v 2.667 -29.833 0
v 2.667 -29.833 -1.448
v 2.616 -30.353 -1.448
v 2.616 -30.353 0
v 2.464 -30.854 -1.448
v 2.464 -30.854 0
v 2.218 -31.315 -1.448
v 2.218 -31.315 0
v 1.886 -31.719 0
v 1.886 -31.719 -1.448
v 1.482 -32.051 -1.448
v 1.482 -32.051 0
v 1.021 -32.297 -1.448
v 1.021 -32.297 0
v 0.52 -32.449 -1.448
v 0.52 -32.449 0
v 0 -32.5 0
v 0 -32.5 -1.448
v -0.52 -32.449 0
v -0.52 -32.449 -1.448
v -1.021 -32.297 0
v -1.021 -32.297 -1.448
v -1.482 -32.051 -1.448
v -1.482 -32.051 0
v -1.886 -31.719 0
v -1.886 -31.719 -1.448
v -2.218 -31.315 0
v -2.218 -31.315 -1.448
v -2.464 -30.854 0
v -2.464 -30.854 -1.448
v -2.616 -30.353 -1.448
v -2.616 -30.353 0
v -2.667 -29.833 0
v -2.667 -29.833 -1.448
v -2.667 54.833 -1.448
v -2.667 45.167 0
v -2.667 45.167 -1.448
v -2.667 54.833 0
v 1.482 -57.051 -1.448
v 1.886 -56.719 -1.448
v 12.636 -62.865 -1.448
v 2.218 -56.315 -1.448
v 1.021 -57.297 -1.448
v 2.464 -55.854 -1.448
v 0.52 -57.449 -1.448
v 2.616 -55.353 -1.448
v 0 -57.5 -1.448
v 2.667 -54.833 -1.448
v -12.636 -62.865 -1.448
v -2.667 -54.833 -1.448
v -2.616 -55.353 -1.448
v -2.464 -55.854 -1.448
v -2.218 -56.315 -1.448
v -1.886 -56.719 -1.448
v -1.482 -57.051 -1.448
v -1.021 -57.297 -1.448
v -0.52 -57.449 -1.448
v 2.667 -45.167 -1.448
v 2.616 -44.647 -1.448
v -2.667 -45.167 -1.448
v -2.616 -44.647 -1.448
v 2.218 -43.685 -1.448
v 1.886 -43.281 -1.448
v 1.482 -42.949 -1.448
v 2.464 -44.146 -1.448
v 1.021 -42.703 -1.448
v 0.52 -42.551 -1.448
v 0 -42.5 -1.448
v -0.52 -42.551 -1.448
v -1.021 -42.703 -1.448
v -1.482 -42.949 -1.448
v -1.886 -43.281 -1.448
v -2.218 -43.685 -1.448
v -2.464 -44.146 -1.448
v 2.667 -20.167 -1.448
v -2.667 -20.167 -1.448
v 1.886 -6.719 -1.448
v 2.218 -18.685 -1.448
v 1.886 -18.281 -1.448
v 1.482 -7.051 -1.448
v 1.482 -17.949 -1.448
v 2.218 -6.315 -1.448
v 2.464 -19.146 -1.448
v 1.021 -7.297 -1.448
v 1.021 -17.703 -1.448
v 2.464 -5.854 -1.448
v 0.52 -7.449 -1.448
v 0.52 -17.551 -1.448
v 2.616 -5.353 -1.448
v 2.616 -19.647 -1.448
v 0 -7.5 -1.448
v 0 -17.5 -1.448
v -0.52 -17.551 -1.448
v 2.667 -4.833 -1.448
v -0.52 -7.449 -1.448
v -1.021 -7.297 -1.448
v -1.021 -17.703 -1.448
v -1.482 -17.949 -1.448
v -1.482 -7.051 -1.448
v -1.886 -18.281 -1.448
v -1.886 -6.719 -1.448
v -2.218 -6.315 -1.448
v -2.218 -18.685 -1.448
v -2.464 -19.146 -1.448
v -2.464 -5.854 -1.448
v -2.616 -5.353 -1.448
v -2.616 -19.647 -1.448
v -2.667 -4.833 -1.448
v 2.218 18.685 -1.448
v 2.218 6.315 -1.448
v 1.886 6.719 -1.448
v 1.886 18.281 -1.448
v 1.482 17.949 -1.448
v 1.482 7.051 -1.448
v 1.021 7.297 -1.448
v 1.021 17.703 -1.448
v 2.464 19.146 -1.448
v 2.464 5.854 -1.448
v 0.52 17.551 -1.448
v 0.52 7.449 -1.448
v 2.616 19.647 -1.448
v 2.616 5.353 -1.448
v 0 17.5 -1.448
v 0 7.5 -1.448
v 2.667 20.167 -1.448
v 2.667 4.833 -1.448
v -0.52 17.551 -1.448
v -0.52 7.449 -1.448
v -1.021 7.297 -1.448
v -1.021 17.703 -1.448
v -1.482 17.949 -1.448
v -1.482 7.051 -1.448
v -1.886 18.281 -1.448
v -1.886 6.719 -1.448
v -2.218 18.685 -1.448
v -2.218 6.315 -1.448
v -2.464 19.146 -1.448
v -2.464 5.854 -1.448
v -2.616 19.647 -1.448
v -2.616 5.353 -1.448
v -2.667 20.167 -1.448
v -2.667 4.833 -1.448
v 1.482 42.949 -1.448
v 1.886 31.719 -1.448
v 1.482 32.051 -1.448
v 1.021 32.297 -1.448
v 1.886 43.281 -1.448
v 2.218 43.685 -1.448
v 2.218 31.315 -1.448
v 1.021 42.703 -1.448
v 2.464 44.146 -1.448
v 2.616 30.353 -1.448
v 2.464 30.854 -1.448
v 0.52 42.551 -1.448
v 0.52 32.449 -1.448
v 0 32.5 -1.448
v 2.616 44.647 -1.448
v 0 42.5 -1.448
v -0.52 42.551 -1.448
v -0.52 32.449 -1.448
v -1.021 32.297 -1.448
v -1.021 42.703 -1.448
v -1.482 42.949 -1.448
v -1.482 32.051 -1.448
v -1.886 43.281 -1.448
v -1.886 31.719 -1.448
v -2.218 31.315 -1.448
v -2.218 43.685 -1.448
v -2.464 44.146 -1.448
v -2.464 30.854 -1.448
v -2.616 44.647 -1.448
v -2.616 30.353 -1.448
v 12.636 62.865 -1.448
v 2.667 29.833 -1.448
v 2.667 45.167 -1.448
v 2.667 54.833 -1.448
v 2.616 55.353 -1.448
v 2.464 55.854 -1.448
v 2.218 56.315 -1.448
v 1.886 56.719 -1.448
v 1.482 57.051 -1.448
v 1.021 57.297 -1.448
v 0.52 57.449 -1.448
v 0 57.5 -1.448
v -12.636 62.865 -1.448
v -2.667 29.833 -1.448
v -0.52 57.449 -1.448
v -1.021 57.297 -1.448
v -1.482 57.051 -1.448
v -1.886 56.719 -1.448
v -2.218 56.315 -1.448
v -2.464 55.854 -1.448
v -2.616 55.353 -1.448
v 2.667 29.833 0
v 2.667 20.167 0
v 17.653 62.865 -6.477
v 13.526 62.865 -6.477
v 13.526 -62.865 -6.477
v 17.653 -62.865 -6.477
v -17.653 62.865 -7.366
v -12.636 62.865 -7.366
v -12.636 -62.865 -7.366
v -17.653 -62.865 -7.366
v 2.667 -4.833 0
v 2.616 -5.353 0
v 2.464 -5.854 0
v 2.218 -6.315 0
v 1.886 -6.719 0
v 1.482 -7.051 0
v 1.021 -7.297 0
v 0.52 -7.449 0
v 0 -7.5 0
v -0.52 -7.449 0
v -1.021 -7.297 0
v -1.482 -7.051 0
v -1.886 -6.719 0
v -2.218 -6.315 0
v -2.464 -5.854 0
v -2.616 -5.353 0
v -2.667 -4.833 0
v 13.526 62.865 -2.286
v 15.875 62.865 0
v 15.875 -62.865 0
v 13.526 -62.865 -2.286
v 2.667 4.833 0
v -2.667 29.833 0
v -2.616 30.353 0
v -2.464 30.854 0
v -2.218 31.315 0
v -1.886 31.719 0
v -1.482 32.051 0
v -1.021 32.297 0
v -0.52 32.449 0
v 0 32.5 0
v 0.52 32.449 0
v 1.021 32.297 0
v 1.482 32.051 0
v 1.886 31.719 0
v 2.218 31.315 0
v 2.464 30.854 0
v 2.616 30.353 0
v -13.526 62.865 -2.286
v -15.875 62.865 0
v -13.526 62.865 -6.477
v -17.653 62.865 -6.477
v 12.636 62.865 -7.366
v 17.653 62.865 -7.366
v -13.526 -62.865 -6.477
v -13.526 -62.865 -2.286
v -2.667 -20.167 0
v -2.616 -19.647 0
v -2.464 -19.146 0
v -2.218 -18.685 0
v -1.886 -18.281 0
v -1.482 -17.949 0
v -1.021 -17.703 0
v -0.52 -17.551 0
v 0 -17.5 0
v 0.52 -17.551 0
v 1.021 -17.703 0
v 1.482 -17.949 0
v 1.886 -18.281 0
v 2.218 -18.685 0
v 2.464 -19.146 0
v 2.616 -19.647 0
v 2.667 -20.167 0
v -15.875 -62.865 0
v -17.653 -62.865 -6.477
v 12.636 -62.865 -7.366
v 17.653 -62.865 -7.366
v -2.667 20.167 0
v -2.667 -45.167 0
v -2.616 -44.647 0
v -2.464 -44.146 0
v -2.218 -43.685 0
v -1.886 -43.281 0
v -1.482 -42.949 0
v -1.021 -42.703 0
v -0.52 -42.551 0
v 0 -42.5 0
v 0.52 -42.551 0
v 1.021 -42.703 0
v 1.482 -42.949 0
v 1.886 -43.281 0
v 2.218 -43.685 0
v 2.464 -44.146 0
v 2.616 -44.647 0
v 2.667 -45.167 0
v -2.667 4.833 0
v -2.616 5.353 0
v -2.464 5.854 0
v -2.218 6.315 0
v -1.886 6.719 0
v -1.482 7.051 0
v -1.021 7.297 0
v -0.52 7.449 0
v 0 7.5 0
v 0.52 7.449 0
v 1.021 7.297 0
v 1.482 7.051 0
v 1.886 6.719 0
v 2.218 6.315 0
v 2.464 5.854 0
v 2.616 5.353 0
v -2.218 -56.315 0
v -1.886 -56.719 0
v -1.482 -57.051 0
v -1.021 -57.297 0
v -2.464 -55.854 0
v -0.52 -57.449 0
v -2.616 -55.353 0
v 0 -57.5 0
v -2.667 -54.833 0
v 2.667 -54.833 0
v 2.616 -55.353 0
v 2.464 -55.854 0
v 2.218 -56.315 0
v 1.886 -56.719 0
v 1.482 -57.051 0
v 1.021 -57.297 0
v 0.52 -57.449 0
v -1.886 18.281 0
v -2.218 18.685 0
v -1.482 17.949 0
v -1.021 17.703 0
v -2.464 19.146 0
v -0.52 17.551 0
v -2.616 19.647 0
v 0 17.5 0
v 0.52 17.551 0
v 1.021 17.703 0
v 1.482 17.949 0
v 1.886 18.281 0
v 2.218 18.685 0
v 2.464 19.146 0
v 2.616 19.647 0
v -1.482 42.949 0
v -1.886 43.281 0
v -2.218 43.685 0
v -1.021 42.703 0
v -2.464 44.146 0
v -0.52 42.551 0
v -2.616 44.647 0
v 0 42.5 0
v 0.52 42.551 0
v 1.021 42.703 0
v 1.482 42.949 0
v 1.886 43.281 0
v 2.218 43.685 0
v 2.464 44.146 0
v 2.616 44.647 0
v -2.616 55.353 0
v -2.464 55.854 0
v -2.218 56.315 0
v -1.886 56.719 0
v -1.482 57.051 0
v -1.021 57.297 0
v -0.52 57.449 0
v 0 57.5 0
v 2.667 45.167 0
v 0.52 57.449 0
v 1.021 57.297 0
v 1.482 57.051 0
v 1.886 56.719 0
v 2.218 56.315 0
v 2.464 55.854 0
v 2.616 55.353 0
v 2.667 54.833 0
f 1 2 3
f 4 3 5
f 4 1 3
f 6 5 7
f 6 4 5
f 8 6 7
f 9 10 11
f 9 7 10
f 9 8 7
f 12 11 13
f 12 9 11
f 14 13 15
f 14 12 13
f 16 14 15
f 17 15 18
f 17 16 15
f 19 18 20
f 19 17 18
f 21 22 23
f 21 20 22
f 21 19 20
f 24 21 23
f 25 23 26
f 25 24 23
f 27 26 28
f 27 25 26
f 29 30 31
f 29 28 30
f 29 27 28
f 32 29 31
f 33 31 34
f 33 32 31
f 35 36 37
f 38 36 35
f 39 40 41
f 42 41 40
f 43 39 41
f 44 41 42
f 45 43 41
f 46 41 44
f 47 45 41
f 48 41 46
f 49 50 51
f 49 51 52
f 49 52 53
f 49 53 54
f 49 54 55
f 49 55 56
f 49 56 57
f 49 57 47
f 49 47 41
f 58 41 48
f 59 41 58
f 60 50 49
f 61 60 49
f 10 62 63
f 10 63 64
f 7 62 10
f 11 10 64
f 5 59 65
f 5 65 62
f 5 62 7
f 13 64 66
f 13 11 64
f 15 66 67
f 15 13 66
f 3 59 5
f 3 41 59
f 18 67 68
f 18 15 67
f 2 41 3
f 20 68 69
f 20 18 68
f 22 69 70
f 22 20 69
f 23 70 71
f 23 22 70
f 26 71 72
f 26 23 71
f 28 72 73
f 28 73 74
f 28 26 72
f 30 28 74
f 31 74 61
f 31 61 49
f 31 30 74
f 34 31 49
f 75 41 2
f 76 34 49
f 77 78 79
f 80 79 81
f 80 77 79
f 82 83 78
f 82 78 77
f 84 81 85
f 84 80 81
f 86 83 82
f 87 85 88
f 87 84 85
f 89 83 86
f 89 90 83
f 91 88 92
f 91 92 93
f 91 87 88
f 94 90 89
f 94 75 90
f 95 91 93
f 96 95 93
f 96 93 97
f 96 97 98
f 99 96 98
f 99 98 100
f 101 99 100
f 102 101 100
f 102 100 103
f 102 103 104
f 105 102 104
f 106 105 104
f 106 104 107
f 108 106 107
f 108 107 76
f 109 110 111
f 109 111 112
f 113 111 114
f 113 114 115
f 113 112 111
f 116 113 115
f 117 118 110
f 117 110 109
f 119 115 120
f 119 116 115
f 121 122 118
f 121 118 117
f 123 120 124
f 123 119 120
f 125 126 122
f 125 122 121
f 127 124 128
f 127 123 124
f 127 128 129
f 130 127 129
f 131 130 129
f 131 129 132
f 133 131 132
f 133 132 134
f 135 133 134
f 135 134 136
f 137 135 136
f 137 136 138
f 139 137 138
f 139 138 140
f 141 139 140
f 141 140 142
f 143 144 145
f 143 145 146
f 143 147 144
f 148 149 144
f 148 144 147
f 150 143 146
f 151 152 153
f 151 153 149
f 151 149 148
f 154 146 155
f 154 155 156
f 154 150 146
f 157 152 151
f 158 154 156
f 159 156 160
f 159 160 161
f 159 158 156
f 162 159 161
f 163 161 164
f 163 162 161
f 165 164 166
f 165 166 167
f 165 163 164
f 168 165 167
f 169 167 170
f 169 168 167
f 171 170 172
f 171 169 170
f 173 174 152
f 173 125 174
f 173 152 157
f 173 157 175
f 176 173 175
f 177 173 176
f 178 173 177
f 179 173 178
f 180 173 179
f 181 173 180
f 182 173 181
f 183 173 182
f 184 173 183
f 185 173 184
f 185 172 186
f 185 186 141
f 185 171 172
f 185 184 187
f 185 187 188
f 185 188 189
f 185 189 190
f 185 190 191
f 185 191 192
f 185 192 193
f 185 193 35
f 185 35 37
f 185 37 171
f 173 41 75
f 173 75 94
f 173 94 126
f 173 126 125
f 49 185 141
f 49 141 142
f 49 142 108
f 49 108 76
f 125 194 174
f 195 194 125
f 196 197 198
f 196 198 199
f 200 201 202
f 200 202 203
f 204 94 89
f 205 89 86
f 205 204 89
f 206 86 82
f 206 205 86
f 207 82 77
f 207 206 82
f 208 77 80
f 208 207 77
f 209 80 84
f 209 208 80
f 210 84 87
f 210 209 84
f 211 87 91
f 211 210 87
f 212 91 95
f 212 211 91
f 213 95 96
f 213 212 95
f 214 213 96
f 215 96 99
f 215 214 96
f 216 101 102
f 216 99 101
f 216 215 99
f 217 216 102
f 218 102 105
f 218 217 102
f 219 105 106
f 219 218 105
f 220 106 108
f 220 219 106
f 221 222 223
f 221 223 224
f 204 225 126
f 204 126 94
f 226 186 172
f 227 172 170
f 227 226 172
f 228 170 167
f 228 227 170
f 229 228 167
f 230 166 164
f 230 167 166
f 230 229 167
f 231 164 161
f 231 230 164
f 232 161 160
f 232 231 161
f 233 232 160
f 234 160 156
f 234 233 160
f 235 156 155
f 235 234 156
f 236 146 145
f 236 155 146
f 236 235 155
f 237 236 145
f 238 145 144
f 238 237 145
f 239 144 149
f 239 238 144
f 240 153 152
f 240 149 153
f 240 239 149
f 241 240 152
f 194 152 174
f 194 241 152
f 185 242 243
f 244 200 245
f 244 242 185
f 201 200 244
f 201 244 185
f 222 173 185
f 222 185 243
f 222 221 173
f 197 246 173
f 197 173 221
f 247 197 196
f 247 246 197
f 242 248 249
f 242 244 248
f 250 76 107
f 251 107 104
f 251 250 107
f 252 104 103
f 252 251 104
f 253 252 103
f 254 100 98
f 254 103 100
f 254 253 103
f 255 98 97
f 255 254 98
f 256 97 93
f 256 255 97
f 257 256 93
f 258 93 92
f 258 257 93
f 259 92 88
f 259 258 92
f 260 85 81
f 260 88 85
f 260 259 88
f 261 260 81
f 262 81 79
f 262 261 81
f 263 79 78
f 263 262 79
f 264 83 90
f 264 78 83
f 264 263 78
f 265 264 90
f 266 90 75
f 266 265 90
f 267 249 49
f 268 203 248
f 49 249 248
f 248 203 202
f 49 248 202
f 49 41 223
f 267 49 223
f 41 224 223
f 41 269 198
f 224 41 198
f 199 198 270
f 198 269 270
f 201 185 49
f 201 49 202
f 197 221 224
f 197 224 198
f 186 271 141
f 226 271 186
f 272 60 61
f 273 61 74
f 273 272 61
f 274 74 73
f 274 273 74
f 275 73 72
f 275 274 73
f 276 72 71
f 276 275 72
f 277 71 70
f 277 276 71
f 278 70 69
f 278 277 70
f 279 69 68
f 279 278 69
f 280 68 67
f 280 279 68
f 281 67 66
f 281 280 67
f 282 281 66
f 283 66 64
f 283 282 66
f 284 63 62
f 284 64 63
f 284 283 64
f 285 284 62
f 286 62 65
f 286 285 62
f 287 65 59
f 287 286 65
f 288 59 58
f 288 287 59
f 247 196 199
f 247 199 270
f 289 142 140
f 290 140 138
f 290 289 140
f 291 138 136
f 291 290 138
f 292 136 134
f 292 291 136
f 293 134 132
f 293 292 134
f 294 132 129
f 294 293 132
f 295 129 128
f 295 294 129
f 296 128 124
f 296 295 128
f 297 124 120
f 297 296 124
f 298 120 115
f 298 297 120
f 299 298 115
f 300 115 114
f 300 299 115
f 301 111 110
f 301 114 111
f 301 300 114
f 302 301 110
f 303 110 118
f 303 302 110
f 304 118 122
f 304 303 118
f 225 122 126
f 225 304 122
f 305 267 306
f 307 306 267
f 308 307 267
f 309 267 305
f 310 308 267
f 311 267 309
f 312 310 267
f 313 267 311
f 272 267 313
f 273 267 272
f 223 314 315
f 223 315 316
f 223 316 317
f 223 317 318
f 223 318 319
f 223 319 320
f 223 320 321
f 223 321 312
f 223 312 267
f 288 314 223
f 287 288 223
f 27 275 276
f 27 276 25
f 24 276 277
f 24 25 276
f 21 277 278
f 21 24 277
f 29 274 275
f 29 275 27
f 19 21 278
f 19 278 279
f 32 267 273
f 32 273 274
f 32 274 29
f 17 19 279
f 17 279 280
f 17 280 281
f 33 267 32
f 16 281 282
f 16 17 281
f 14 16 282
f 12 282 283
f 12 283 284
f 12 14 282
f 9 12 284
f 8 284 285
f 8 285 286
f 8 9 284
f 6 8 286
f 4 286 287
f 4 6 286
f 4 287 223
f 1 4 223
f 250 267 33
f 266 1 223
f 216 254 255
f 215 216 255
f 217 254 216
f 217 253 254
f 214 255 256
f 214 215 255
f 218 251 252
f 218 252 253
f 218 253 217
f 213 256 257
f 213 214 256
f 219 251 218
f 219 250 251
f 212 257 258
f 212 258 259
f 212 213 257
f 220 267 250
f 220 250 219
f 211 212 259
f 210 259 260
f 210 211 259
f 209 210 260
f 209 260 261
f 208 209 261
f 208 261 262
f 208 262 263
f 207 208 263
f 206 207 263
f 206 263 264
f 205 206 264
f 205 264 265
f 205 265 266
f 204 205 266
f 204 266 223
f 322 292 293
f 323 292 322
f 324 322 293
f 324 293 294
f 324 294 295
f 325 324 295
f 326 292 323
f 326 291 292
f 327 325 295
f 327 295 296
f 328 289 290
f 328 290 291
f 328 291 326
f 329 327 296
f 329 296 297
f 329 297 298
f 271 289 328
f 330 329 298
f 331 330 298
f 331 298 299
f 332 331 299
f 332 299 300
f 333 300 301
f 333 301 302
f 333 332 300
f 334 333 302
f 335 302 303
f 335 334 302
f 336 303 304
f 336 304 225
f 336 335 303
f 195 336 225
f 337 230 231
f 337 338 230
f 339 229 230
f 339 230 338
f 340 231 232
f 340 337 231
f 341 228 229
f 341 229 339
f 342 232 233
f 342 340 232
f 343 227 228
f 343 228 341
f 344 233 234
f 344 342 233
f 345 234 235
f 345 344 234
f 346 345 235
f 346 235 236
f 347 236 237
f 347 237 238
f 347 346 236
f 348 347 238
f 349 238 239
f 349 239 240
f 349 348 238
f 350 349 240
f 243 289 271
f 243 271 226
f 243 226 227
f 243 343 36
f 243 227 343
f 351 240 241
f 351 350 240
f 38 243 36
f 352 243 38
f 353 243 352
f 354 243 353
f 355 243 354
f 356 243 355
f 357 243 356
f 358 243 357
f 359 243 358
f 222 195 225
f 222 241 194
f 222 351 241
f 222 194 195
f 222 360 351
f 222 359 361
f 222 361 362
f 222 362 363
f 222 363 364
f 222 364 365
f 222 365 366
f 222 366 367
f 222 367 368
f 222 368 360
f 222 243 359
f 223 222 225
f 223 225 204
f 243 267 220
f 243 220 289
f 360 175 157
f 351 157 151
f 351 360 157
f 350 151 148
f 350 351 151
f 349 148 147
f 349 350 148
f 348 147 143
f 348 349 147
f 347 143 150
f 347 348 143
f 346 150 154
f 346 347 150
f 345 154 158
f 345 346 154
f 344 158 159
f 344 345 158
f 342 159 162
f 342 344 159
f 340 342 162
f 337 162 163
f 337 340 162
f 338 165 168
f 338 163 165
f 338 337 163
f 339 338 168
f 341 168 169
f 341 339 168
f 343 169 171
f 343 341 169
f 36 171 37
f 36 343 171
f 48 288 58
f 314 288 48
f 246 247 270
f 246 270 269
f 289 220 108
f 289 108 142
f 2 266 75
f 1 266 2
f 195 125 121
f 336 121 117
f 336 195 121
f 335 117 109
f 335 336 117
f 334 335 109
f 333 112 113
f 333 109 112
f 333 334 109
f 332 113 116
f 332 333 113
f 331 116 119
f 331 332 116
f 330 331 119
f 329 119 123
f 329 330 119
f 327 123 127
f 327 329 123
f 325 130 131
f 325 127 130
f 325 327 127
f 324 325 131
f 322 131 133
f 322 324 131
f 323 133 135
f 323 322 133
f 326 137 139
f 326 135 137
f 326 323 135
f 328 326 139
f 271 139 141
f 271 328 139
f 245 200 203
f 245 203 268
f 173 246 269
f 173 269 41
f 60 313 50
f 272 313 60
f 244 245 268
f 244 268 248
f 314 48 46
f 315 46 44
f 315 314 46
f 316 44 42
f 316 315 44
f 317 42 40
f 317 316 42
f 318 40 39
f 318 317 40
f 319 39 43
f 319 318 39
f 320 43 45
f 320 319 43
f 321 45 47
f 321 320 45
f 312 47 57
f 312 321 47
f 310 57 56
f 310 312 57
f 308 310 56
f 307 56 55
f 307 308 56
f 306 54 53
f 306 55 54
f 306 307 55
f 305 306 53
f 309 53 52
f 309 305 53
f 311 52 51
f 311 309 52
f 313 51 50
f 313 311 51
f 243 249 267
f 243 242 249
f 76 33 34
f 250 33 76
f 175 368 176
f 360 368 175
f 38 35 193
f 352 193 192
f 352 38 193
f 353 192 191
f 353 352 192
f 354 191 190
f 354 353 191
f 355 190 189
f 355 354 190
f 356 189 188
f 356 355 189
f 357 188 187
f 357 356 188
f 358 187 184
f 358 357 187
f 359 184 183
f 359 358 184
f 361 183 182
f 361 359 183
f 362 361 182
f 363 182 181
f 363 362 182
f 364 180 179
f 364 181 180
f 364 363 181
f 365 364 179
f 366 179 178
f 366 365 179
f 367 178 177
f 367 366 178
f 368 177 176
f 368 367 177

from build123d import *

# Parameters (mm, degrees)
BOSS_EXTRUDE1_DEPTH = 62.865
CUT_EXTRUDE1_DEPTH  = 66.710688552


with BuildPart() as part:
    # Sketch1 → Boss-Extrude1 (new, symmetric)
    with BuildSketch(Plane(origin=(0, 0, 0), x_dir=(1, 0, 0), z_dir=(0, 1, 0))):
        Polygon((-15.875, 0), (0, 0), (0, 1.4478), (-12.6365, 1.4478), (-12.6365, 7.366), (-17.653, 7.366), (-17.653, 6.477), (-13.5255, 6.477), (-13.5255, 2.286), align=None)
        Polygon((0, 1.4478), (0, 0), (15.875, 0), (13.5255, 2.286), (13.5255, 6.477), (17.653, 6.477), (17.653, 7.366), (12.6365, 7.366), (12.6365, 1.4478), align=None)
    extrude(amount=BOSS_EXTRUDE1_DEPTH, both=True)

    # Sketch2 → Cut-Extrude1 (cut, through all)
    with BuildSketch(Plane.XY):
        with BuildLine():
            Line((-2.667, -4.833), (-2.667, 4.833))
            ThreePointArc((-2.667, 4.833), (0, 7.5), (2.667, 4.833))
            Line((2.667, 4.833), (2.667, -4.833))
            ThreePointArc((2.667, -4.833), (0, -7.5), (-2.667, -4.833))
        make_face()
        with BuildLine():
            Line((-2.667, 20.167), (-2.667, 29.833))
            ThreePointArc((-2.667, 29.833), (0, 32.5), (2.667, 29.833))
            Line((2.667, 29.833), (2.667, 20.167))
            ThreePointArc((2.667, 20.167), (0, 17.5), (-2.667, 20.167))
        make_face()
        with BuildLine():
            Line((-2.667, 45.167), (-2.667, 54.833))
            ThreePointArc((-2.667, 54.833), (0, 57.5), (2.667, 54.833))
            Line((2.667, 54.833), (2.667, 45.167))
            ThreePointArc((2.667, 45.167), (0, 42.5), (-2.667, 45.167))
        make_face()
        with BuildLine():
            Line((-2.667, -29.833), (-2.667, -20.167))
            ThreePointArc((-2.667, -20.167), (0, -17.5), (2.667, -20.167))
            Line((2.667, -20.167), (2.667, -29.833))
            ThreePointArc((2.667, -29.833), (0, -32.5), (-2.667, -29.833))
        make_face()
        with BuildLine():
            Line((-2.667, -54.833), (-2.667, -45.167))
            ThreePointArc((-2.667, -45.167), (0, -42.5), (2.667, -45.167))
            Line((2.667, -45.167), (2.667, -54.833))
            ThreePointArc((2.667, -54.833), (0, -57.5), (-2.667, -54.833))
        make_face()
    extrude(amount=-CUT_EXTRUDE1_DEPTH, mode=Mode.SUBTRACT)


solid = part.part
